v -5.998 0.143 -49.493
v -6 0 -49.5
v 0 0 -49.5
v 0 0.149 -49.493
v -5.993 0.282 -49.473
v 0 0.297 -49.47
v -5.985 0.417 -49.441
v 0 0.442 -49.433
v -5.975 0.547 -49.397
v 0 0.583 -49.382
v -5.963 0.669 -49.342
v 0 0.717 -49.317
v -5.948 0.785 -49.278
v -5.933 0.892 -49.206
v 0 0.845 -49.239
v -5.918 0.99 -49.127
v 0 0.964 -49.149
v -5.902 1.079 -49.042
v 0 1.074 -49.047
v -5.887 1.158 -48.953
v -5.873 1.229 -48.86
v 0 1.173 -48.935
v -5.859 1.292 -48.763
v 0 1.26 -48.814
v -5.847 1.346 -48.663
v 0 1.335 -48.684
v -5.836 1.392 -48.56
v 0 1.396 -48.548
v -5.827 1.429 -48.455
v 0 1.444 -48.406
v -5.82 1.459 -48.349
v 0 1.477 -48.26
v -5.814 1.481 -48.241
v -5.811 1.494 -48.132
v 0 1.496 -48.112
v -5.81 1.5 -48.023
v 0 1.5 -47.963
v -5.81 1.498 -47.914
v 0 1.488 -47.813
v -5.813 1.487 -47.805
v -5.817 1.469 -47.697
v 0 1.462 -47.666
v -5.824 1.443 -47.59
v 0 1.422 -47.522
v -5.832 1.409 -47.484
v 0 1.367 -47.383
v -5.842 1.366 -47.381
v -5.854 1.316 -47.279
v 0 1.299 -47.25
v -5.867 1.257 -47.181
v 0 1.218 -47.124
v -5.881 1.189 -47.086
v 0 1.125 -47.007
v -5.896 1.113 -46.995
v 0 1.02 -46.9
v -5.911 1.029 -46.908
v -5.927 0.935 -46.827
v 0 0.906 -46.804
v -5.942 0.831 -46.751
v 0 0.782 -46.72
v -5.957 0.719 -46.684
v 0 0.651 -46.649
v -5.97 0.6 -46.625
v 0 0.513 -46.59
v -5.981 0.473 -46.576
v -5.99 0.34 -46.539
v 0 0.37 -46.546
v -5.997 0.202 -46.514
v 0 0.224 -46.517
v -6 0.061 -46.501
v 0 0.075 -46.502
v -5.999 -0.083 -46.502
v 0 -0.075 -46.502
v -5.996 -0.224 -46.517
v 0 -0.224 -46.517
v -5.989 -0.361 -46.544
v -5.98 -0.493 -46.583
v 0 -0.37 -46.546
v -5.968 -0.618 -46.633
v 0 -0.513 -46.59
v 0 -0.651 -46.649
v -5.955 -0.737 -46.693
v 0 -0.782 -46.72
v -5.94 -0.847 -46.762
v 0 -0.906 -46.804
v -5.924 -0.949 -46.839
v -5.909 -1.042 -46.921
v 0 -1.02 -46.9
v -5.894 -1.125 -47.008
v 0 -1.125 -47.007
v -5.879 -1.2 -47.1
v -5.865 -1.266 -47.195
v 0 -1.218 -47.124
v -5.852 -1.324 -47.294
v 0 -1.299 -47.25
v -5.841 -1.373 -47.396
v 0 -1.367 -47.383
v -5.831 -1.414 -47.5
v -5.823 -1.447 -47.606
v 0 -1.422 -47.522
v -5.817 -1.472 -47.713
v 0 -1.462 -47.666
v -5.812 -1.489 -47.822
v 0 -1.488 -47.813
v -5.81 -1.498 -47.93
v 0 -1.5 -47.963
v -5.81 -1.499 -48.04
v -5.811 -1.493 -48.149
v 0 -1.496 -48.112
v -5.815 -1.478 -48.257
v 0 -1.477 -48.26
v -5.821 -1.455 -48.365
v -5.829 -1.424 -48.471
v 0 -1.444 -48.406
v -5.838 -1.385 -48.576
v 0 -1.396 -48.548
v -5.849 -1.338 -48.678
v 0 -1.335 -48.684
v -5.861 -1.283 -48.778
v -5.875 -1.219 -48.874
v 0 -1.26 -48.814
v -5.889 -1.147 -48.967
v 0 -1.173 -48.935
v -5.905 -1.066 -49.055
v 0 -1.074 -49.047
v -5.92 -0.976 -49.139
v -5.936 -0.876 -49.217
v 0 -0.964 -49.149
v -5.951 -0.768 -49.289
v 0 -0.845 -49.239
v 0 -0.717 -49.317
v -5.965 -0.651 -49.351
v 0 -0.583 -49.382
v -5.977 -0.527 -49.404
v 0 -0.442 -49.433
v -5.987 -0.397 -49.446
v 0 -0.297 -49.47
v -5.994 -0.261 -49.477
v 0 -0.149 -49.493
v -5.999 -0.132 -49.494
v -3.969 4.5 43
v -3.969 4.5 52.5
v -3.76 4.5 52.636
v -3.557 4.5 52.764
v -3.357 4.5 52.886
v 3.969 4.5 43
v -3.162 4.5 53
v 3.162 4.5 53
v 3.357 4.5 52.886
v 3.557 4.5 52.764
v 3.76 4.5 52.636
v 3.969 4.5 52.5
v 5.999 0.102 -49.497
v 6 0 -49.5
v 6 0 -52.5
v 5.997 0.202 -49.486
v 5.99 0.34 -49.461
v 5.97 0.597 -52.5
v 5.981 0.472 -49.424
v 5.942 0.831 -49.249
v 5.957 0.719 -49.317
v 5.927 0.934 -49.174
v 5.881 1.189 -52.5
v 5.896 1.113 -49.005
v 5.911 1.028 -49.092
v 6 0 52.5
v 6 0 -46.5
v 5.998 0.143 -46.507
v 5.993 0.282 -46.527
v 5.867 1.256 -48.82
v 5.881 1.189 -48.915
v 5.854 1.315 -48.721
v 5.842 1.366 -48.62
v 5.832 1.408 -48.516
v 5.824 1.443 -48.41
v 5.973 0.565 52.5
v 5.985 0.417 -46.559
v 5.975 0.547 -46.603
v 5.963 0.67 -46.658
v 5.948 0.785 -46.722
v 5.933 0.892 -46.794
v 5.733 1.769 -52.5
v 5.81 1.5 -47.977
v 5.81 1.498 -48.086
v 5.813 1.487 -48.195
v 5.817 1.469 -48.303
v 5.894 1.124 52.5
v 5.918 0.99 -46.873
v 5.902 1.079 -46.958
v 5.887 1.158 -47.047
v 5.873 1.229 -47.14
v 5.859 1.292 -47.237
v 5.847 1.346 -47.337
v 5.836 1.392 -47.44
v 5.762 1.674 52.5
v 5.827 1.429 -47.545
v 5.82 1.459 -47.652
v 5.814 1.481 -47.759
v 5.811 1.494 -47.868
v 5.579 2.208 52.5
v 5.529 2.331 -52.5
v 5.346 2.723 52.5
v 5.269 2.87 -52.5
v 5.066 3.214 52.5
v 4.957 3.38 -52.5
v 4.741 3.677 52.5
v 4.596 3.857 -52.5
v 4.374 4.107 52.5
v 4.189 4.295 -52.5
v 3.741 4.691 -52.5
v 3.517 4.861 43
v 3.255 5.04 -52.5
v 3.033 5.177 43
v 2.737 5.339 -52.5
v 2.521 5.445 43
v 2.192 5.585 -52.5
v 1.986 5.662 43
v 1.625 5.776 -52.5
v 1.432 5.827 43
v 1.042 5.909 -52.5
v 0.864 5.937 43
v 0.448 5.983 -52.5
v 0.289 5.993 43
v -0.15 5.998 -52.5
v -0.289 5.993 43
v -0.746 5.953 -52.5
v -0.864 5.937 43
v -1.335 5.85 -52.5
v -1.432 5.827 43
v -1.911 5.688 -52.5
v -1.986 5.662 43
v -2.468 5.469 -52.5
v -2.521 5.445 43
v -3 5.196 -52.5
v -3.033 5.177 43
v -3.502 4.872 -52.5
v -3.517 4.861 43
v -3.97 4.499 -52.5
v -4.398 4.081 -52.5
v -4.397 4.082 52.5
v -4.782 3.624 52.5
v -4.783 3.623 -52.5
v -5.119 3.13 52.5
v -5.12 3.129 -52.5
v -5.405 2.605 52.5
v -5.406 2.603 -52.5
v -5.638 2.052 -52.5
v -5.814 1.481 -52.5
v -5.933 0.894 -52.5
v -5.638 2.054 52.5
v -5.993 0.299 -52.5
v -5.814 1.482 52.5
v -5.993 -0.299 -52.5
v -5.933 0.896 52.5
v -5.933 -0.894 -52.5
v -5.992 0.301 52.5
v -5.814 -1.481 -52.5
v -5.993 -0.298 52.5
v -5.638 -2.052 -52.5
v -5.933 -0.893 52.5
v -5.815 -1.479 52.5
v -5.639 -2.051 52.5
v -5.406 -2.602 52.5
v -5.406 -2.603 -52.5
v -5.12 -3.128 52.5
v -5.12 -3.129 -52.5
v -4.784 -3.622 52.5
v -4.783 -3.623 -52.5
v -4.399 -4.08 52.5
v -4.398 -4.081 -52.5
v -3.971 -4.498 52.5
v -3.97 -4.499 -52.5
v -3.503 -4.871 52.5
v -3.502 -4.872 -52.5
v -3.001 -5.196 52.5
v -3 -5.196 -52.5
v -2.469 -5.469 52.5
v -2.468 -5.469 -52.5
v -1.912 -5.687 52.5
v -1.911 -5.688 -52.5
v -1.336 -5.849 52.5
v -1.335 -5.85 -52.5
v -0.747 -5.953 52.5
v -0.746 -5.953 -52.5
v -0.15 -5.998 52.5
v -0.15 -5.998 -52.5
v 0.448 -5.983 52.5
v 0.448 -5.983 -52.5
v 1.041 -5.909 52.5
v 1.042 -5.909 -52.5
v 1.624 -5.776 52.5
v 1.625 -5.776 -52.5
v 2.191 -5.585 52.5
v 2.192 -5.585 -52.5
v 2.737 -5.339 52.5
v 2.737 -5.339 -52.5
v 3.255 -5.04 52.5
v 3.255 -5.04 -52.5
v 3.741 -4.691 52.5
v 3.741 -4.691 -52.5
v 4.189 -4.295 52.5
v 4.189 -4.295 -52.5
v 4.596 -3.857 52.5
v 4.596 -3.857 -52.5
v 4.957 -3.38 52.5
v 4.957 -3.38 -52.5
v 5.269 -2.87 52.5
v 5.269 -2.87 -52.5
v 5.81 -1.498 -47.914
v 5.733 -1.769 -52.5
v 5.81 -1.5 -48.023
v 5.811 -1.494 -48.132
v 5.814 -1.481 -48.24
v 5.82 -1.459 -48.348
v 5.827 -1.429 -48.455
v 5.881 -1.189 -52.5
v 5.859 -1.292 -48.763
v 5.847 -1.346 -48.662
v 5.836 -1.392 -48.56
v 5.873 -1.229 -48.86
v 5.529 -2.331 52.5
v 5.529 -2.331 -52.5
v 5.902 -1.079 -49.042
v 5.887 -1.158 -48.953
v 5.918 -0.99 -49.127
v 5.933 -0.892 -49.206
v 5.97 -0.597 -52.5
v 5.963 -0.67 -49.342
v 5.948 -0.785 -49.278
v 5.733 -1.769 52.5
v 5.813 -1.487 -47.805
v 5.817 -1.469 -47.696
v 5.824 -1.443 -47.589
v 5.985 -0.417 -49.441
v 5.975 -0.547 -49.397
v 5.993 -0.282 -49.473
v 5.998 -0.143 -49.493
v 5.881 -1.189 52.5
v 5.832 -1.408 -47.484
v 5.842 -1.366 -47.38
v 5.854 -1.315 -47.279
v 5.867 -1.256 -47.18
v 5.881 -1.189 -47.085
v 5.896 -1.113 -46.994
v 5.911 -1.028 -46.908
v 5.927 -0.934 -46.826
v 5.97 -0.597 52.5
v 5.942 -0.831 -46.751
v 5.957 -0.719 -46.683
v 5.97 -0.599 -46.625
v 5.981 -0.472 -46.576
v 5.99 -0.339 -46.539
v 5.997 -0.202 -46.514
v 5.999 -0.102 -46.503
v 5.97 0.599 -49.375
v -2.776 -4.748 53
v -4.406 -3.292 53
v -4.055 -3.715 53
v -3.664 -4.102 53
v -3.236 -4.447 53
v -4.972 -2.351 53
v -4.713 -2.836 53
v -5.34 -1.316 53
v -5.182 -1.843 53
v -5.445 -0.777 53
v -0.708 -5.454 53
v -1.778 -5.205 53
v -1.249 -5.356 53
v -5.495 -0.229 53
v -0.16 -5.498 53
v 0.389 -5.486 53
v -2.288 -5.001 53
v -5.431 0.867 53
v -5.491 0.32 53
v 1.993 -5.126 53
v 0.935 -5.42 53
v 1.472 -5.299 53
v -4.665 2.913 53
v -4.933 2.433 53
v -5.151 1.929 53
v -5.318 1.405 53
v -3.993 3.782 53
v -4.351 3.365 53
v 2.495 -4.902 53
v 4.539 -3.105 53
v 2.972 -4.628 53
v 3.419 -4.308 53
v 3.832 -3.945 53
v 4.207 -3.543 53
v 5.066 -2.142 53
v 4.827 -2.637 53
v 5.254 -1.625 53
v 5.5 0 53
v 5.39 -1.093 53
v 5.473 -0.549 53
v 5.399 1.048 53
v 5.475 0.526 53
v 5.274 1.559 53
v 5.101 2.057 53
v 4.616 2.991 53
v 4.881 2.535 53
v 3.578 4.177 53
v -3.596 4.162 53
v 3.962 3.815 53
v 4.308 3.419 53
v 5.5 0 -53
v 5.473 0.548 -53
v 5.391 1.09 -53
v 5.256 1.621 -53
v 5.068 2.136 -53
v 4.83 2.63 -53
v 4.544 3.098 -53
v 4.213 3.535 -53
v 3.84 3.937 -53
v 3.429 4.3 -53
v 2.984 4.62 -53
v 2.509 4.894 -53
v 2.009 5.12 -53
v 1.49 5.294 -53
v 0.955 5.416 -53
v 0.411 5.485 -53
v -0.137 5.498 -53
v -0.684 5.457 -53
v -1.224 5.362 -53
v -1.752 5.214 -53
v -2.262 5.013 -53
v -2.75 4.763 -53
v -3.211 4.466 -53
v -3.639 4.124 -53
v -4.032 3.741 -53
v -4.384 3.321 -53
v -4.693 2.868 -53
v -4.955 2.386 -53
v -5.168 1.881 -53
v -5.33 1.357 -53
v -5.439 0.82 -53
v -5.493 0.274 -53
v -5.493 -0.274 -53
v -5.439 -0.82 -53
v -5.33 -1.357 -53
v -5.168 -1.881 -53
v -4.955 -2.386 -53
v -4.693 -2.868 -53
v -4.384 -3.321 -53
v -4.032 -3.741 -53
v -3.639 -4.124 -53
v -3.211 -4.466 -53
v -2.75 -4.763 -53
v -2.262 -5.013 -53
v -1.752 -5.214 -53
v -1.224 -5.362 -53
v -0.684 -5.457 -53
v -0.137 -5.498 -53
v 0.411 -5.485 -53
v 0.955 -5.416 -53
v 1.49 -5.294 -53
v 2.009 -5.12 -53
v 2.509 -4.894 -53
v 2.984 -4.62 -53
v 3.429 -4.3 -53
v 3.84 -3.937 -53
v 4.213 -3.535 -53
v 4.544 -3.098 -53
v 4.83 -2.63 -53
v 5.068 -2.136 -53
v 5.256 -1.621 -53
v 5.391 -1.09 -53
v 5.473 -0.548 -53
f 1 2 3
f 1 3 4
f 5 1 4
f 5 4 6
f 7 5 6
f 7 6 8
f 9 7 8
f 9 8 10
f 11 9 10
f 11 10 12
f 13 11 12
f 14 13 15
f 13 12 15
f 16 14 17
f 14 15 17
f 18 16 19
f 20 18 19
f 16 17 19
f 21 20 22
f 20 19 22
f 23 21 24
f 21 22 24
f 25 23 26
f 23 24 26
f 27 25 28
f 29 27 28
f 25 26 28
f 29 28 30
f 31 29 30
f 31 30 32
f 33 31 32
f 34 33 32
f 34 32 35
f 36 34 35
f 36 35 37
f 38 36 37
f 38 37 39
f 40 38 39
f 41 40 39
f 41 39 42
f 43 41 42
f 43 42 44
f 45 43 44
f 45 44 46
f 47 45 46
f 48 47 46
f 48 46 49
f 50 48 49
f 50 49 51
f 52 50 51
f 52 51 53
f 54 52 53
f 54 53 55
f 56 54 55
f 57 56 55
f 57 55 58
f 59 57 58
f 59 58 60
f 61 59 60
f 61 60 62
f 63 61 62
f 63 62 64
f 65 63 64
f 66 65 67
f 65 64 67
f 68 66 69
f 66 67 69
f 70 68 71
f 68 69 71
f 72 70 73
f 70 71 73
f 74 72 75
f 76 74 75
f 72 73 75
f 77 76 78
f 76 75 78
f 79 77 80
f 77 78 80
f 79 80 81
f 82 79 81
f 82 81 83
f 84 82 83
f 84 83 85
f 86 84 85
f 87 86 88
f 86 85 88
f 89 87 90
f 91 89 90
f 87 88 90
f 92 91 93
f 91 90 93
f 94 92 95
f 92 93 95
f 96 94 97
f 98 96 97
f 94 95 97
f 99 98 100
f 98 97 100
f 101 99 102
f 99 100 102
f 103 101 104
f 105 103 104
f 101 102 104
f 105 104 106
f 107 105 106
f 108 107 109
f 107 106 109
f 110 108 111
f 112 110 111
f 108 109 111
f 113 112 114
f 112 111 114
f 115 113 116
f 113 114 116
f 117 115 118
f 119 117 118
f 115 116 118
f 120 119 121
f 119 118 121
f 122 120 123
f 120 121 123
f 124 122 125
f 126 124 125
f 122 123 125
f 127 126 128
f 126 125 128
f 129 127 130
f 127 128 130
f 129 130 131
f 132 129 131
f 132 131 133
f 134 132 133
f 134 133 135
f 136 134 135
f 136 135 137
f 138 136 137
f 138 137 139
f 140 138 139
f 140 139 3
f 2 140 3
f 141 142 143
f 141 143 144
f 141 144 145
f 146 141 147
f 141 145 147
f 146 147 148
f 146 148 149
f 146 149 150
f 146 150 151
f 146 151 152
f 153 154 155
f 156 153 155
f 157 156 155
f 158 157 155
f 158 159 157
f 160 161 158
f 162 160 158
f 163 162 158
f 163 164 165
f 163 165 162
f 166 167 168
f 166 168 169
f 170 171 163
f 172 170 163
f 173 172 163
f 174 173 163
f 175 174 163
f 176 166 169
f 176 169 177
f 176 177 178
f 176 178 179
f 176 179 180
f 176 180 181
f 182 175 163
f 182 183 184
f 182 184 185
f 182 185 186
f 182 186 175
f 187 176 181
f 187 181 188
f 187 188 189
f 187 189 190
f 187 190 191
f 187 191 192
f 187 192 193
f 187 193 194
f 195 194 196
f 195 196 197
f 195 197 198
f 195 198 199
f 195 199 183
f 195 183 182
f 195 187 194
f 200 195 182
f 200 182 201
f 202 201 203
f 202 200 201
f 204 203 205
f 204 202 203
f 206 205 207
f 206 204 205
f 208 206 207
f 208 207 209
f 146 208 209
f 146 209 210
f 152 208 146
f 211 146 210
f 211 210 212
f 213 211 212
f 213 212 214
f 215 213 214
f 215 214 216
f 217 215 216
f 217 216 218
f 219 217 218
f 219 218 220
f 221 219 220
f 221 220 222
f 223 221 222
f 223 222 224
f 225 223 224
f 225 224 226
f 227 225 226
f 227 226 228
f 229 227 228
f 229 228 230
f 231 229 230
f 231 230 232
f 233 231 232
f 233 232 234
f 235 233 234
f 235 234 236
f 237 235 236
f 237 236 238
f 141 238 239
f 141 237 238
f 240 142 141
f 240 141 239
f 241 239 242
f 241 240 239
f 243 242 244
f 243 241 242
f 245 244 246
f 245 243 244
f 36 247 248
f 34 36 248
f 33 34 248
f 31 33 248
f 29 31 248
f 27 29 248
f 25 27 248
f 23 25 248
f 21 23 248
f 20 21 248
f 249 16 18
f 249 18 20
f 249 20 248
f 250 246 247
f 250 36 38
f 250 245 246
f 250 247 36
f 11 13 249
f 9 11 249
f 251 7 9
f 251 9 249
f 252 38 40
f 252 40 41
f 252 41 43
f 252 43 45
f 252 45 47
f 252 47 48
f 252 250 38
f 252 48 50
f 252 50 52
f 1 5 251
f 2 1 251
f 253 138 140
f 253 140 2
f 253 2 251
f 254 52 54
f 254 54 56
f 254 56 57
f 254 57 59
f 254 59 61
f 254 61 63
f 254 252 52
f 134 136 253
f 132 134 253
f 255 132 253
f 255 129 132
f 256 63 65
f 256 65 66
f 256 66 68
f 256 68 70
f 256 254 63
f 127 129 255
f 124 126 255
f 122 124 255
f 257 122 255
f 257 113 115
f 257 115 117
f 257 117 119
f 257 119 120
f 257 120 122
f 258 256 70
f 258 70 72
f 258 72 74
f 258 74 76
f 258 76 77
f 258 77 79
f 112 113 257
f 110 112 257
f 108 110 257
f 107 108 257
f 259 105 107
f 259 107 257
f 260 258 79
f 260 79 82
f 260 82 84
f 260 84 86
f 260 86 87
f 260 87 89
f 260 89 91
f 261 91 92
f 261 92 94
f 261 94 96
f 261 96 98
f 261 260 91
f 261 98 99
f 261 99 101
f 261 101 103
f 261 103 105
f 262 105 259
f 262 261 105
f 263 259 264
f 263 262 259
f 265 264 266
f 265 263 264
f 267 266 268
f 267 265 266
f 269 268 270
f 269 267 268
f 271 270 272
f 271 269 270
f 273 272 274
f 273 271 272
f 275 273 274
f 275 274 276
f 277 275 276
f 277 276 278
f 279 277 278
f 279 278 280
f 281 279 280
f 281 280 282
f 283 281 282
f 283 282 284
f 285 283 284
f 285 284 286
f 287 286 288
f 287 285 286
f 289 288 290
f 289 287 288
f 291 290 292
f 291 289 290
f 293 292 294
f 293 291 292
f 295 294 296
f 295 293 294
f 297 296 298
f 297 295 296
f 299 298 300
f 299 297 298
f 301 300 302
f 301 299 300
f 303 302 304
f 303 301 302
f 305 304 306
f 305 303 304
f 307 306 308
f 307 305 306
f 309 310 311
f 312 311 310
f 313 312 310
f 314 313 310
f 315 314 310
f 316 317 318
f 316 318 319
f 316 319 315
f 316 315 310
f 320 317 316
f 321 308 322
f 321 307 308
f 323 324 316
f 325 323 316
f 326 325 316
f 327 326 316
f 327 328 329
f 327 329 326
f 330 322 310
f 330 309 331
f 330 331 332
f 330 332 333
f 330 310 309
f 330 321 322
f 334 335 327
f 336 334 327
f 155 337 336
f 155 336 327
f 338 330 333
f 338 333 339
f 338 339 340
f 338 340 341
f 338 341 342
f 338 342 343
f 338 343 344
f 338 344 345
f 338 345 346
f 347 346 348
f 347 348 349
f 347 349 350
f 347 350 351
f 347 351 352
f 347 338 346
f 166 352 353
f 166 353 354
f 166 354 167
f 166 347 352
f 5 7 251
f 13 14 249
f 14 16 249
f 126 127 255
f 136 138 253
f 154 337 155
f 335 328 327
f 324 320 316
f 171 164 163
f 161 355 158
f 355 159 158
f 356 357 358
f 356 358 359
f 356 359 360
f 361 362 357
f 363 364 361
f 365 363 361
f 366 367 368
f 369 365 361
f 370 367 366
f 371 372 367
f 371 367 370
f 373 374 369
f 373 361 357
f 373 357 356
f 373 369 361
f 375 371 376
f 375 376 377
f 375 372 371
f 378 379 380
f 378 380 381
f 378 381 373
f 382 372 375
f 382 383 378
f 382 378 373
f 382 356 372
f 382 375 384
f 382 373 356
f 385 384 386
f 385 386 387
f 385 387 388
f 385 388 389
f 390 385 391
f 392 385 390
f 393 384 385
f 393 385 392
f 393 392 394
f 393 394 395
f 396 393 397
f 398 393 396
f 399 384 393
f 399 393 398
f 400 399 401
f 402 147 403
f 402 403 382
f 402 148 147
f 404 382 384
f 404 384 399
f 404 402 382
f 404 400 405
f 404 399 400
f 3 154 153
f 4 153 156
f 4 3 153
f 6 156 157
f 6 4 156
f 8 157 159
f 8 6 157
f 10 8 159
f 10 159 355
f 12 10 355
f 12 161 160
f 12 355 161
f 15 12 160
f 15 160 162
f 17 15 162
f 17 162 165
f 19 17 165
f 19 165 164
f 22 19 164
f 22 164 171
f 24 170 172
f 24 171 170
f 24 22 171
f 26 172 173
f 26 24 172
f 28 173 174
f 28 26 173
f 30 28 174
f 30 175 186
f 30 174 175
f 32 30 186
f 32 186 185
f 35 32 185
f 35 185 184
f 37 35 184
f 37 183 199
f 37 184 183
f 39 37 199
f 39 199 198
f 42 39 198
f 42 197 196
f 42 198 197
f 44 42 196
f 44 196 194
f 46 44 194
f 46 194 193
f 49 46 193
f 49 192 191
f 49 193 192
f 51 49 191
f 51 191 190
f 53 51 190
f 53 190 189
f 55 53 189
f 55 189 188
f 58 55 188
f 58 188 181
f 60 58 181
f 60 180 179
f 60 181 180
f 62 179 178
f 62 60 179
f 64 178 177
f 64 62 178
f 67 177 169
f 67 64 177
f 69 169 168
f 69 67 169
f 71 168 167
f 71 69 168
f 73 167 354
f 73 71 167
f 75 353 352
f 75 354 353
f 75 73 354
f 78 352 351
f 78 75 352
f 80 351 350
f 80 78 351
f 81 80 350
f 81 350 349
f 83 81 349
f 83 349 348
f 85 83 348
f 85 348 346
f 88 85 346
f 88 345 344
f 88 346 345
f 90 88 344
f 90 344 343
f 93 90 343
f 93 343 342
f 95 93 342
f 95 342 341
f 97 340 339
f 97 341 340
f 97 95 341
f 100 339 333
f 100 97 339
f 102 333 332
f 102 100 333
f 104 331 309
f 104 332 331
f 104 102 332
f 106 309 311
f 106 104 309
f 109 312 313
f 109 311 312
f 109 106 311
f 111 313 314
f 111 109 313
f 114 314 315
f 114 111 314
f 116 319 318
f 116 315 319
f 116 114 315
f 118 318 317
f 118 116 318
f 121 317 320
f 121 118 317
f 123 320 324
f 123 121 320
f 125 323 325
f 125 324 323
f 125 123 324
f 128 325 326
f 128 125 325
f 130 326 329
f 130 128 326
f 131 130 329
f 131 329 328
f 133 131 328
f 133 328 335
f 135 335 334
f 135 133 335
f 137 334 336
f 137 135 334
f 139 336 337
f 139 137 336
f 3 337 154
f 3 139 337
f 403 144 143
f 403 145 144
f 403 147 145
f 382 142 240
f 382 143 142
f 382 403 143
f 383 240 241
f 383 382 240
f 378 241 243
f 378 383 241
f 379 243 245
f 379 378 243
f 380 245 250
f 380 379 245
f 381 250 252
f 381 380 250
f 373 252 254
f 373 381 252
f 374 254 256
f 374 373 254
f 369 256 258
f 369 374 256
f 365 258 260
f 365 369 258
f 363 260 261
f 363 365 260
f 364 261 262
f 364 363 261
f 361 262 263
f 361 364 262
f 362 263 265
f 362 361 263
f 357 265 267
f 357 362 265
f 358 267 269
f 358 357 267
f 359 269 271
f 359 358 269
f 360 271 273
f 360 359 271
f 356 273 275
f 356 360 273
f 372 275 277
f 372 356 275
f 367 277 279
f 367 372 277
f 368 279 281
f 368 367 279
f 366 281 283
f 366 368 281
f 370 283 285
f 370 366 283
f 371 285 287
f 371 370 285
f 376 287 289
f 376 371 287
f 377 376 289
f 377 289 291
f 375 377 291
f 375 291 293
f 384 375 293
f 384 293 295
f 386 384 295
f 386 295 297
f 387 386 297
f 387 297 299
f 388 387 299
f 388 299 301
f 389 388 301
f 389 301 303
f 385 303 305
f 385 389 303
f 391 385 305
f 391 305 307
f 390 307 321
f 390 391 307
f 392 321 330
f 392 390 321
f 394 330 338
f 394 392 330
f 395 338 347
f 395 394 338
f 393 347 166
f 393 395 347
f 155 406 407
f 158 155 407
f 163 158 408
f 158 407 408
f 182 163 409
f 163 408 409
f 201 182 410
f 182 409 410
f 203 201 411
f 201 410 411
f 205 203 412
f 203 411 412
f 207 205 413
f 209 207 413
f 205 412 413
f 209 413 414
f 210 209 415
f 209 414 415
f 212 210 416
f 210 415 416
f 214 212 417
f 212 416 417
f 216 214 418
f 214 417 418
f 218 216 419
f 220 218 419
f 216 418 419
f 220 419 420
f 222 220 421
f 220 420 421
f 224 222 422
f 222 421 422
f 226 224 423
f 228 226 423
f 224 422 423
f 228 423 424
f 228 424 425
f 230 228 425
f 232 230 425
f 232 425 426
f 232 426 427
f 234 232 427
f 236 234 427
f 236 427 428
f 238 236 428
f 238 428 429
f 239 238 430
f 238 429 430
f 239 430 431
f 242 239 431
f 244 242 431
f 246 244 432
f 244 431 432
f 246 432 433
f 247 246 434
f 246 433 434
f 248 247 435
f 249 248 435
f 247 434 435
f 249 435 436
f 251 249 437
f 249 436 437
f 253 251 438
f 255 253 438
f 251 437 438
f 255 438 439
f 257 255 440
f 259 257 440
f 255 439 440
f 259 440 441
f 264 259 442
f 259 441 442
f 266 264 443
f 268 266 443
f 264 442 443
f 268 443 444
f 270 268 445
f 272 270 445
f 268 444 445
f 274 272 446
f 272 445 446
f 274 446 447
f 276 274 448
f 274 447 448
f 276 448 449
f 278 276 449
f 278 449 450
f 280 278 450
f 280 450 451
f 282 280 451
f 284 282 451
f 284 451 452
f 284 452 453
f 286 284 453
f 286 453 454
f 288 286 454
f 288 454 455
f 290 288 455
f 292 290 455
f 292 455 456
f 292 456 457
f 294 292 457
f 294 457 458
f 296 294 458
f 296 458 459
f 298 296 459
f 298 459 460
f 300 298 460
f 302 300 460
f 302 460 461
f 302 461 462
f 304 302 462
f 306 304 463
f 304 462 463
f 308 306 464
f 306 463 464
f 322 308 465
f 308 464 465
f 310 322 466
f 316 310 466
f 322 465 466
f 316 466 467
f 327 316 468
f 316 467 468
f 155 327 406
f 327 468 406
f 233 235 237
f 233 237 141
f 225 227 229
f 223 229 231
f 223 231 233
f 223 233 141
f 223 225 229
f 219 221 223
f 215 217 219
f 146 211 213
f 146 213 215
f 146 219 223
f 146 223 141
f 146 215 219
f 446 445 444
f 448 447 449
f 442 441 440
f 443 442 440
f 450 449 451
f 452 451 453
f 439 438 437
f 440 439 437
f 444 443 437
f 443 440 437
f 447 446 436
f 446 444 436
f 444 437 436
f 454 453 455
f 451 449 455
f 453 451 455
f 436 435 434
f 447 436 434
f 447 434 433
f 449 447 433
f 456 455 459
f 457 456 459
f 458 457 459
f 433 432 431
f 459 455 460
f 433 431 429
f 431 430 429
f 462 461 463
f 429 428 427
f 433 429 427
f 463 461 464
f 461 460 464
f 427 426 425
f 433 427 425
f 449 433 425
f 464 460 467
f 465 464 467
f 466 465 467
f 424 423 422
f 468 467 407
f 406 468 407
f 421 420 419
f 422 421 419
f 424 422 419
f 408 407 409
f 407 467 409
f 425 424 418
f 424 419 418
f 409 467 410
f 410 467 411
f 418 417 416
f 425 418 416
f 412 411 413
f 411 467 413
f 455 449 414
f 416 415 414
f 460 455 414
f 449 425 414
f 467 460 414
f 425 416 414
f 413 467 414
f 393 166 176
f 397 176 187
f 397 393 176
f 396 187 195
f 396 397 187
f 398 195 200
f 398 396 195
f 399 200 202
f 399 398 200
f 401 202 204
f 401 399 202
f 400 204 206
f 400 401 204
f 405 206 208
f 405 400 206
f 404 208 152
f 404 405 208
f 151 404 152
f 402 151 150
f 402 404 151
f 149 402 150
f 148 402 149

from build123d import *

# Parameters (mm, degrees)
SKETCH1_R              = 6
SHAFT_DEPTH            = 53
HOLE_REACH             = 8
SKETCH2_R              = 1.5
HOLE_DIRECTION_2_REACH = 8
F_0_5X45_CHAMFERS_SIZE = 0.5
FLAT_DEPTH             = 10


with BuildPart() as part:
    # Sketch1 → Shaft (new body, symmetric)
    with BuildSketch(Plane.XY):
        Circle(SKETCH1_R)
    extrude(amount=SHAFT_DEPTH, both=True)

    # Sketch2 → Hole (cut, up to next)
    with BuildSketch(Plane(origin=(0, 0, 0), x_dir=(0, 0, -1), z_dir=(1, 0, 0)), mode=Mode.PRIVATE) as hole_sk1:
        with Locations((48, 0)):
            Circle(SKETCH2_R)
    hole_tool1 = extrude(hole_sk1.sketch, amount=-HOLE_REACH, mode=Mode.PRIVATE) & part.part
    add(hole_tool1.solids().sort_by_distance((0, 0, -48))[0], mode=Mode.SUBTRACT)

    # Sketch2 → Hole direction 2 (cut, up to next)
    with BuildSketch(Plane(origin=(0, 0, 0), x_dir=(0, 0, -1), z_dir=(1, 0, 0)), mode=Mode.PRIVATE) as hole_direction_2_sk1:
        with Locations((48, 0)):
            Circle(SKETCH2_R)
    hole_direction_2_tool1 = extrude(hole_direction_2_sk1.sketch, amount=HOLE_DIRECTION_2_REACH, mode=Mode.PRIVATE) & part.part
    add(hole_direction_2_tool1.solids().sort_by_distance((0, 0, -48))[0], mode=Mode.SUBTRACT)

    # 0.5x45 Chamfers
    f_0_5x45_chamfers_edges = [part.edges().sort_by_distance(p)[0] for p in [
        (-6, 0, -53),
        (-6, 0, 53),
    ]]
    chamfer(f_0_5x45_chamfers_edges, length=F_0_5X45_CHAMFERS_SIZE)

    # Sketch4 → Flat (cut)
    with BuildSketch(Plane.XY.offset(53)):
        with BuildLine():
            Line((-3.968626967, 4.5), (3.968626967, 4.5))
            ThreePointArc((3.968626967, 4.5), (0, 6), (-3.968626967, 4.5))
        make_face()
    extrude(amount=-FLAT_DEPTH, mode=Mode.SUBTRACT)


solid = part.part
